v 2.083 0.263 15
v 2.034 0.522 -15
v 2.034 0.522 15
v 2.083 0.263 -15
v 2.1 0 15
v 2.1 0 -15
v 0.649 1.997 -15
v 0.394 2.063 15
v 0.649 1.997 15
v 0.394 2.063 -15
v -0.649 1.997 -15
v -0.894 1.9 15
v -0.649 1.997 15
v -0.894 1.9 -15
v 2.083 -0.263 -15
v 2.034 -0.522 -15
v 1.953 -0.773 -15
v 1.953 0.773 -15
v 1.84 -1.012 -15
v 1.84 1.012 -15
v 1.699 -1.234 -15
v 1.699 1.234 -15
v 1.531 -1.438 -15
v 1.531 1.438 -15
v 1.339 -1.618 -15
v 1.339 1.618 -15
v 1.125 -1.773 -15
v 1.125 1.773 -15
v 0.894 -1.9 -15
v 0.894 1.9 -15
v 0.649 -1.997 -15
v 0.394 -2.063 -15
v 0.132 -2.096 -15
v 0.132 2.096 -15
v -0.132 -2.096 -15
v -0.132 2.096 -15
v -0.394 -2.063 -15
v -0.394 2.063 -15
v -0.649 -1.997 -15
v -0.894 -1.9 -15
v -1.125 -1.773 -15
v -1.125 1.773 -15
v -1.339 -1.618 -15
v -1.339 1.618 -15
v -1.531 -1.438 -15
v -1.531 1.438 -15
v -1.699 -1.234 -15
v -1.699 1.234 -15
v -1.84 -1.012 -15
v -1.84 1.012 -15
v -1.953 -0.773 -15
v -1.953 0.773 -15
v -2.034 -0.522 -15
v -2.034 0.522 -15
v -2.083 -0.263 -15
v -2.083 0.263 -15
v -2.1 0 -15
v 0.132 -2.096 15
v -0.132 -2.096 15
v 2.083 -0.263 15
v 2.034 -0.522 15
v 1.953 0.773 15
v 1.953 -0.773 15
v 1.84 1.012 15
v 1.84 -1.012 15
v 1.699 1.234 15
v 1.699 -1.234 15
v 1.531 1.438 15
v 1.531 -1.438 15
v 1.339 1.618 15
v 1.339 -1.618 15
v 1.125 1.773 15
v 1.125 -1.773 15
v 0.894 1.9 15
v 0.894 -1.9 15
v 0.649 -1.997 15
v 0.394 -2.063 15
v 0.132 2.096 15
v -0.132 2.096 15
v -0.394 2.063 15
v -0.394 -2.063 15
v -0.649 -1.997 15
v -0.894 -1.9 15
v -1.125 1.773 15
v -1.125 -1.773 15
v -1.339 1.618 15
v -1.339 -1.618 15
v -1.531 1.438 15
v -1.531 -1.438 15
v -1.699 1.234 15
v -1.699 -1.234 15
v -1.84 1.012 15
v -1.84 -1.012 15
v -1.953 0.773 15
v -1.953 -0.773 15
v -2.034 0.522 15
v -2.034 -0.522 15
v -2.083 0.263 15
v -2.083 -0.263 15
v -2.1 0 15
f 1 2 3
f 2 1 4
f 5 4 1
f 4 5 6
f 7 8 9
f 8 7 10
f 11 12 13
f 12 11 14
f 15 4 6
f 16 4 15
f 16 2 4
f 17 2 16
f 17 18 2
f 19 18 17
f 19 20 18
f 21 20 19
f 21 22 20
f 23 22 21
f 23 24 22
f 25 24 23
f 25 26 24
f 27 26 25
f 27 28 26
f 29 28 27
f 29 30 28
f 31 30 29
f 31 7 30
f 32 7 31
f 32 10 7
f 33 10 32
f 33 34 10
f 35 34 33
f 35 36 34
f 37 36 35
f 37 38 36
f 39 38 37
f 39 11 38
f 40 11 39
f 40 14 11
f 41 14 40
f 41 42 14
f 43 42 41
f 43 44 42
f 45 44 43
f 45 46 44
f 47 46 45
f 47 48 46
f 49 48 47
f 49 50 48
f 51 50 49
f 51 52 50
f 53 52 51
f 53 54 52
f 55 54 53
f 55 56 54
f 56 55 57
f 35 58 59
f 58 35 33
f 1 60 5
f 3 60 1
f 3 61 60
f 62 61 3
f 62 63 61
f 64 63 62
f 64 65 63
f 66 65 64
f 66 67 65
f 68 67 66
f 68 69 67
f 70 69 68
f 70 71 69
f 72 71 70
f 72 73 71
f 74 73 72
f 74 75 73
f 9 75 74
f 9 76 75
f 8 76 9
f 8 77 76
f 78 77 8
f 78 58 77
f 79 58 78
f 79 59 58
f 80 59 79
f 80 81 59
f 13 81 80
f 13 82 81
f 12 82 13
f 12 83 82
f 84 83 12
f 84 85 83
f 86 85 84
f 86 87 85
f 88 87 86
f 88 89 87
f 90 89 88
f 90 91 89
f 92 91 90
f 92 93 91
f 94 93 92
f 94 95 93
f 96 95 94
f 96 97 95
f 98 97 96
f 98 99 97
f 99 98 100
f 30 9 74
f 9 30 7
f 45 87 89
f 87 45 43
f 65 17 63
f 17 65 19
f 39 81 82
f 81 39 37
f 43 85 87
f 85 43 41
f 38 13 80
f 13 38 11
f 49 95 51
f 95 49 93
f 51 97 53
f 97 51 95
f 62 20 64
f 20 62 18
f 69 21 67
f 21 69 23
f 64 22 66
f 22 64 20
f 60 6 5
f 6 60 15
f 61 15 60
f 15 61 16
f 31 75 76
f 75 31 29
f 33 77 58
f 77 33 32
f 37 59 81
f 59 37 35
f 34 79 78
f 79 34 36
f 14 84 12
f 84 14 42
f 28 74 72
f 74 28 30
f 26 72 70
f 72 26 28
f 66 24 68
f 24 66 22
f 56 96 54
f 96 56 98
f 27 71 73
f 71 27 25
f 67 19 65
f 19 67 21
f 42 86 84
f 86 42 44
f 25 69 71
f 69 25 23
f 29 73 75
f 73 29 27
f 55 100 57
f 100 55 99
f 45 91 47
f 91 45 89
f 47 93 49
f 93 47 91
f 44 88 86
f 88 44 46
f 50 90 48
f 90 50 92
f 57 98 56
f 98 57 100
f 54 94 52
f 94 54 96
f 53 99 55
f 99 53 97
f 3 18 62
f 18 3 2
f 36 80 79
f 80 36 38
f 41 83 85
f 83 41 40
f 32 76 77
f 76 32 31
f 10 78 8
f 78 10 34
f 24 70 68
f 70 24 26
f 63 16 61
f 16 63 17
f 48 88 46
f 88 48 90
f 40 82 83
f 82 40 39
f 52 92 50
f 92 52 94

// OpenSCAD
$fn = 50;


difference() {
	union() {
		translate(v = [0, 0, -15.0000000000]) {
			cylinder(h = 30, r = 2.1000000000);
		}
	}
	union() {
		translate(v = [0, 0, -100.0000000000]) {
			cylinder(h = 200, r = 0);
		}
	}
}
